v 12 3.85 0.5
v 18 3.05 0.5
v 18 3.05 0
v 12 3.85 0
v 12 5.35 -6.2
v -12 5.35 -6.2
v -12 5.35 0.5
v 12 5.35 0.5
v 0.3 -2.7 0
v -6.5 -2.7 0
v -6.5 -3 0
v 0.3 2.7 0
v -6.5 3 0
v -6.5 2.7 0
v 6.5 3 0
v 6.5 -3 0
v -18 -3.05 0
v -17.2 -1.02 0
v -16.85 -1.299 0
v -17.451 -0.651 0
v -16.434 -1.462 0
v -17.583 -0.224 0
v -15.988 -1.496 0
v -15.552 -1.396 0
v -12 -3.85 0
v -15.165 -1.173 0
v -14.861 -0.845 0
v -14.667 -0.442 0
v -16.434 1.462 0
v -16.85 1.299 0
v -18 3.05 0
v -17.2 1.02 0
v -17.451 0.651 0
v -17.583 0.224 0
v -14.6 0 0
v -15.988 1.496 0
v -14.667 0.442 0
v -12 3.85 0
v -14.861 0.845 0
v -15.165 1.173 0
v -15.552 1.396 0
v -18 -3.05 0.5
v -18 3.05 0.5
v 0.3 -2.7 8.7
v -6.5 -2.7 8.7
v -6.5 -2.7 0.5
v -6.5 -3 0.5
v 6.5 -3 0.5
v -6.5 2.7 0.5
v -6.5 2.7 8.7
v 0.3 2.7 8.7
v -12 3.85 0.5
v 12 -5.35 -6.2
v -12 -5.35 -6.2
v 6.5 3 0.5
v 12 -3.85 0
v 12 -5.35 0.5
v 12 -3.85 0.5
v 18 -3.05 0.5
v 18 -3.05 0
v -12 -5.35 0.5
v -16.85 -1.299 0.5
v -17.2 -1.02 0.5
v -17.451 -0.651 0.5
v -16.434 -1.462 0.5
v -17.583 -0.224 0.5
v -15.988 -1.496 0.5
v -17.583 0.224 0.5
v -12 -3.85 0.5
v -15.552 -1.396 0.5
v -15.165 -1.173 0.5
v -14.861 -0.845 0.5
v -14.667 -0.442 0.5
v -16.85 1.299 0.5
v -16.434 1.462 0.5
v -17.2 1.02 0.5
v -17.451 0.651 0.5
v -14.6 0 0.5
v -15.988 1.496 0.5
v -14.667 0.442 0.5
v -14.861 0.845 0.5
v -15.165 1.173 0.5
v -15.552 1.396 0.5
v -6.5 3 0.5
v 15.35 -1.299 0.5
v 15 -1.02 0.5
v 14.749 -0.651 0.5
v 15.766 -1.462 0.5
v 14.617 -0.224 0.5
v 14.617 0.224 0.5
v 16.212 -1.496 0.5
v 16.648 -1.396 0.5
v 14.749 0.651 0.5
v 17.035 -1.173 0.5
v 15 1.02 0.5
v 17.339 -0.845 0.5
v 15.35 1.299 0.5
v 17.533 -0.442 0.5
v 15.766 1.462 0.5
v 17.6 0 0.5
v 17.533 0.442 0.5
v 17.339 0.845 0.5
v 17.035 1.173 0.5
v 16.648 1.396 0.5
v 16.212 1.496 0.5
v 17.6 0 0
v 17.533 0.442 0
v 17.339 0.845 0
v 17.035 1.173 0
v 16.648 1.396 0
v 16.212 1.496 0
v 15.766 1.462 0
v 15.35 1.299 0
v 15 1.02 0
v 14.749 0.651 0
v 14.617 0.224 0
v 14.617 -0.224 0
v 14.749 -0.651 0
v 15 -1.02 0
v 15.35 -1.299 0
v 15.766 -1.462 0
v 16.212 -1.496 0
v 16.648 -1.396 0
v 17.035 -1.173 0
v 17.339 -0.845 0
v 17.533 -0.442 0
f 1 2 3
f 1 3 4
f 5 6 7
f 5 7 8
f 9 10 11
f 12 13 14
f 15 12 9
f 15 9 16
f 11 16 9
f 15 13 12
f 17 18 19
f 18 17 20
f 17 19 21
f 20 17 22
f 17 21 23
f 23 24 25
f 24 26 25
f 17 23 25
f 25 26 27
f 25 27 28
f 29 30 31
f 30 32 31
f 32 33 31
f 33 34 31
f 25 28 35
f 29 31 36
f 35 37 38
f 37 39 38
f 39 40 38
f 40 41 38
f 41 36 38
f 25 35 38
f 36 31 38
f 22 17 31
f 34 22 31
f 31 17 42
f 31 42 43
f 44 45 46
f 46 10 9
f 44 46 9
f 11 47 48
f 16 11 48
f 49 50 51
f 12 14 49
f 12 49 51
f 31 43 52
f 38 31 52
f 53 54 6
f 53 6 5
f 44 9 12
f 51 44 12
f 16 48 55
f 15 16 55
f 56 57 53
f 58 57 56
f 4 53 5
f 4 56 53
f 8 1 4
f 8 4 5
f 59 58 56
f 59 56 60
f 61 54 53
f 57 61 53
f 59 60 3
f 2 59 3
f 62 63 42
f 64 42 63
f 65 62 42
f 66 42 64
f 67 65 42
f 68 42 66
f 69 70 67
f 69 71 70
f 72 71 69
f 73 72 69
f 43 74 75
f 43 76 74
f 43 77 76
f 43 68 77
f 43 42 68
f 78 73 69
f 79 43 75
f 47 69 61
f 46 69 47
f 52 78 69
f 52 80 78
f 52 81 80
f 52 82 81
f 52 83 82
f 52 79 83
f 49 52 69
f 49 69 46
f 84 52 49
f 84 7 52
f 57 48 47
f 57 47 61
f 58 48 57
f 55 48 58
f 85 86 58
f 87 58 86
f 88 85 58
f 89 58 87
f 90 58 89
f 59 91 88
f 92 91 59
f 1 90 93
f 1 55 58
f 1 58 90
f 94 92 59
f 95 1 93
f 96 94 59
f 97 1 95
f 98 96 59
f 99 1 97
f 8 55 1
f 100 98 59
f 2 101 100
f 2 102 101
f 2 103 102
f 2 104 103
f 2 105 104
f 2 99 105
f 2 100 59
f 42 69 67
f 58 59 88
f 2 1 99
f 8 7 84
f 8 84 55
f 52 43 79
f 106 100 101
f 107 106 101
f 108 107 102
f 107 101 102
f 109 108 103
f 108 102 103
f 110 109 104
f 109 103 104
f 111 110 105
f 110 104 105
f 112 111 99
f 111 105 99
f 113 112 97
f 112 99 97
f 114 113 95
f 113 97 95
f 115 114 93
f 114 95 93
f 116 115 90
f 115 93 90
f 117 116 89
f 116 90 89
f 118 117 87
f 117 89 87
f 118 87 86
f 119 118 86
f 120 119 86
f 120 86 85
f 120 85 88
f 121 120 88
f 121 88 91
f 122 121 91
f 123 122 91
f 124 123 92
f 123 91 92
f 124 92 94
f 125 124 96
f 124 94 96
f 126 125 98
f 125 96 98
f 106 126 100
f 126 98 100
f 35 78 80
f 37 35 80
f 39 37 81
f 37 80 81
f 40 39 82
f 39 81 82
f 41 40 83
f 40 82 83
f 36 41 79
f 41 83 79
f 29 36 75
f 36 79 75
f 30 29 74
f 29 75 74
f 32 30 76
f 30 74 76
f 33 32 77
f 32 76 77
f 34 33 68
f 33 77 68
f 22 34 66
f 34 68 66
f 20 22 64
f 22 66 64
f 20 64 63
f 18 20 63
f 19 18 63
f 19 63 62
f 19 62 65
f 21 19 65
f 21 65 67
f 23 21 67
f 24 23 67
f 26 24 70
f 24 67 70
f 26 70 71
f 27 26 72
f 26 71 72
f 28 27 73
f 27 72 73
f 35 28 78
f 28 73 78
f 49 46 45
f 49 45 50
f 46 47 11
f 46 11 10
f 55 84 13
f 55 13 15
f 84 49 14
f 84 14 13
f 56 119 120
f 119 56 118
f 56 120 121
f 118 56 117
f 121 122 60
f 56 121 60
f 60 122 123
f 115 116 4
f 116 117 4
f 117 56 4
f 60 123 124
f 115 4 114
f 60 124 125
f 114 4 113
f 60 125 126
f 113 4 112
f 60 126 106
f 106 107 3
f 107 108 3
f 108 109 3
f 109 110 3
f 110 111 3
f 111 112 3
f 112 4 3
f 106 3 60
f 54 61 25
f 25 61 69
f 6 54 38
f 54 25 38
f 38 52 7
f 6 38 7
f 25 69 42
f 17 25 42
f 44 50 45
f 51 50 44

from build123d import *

# Parameters (mm, degrees)
F0_W      = 36
F0_H      = 10.7
F1_DEPTH  = 0.5
F2_W      = 24
F2_H      = 10.7
F3_DEPTH  = 6.2
F4_W      = 13
F4_H      = 6
F5_DEPTH  = 0.5
F6_W      = 6.8
F6_H      = 5.4
F7_DEPTH  = 8.7
F8_R      = 1.5
F9_DEPTH  = 0.5
F11_DEPTH = 0.5


# Not quite as in the source:
# - a pattern or mirror of a feature is missing from the dataset's text; its kind, count and spacing are read off the source's solid


with BuildPart() as f1:
    # F0 (on Top) → F1 (new body)
    with BuildSketch(Plane.XY):
        Rectangle(F0_W, F0_H)
    extrude(amount=F1_DEPTH)

    # F2 (on face) → F3 (join)
    with BuildSketch(Plane(origin=(0, 0, 0), x_dir=(1, 0, 0), z_dir=(0, 0, -1))):
        Rectangle(F2_W, F2_H)
    extrude(amount=F3_DEPTH)

    # F4 (on face) → F5 (cut)
    with BuildSketch(Plane.XY.offset(0.5)):
        Rectangle(F4_W, F4_H)
    extrude(amount=-F5_DEPTH, mode=Mode.SUBTRACT)

    # F6 (on face) → F7 (join)
    with BuildSketch(Plane.XY):
        with Locations((-3.1, 0)):
            Rectangle(F6_W, F6_H)
    extrude(amount=F7_DEPTH)

    # F8 (on face) → F9 (cut, through all)
    with BuildSketch(Plane.XY.offset(0.5)):
        with Locations((-16.1, 0)):
            Circle(F8_R)
        with Locations((16.1, 0)):
            Circle(F8_R)
    extrude(amount=-F9_DEPTH, mode=Mode.SUBTRACT)

    # F10 (on face) → F11 (cut, through all)
    with BuildSketch(Plane.XY.offset(0.5)):
        Polygon((-12, 3.85), (-12, 5.35), (-18, 5.35), (-18, 3.05), align=None)
        Polygon((-12, -3.85), (-18, -3.05), (-18, -5.35), (-12, -5.35), align=None)
    f11 = extrude(amount=-F11_DEPTH, mode=Mode.SUBTRACT)

    # F11_copies: F11 across plane
    add(f11.mirror(Plane(origin=(0, 0, 0), x_dir=(0, 0, 1), z_dir=(1, 0, 0))), mode=Mode.SUBTRACT)


solid = f1.part
